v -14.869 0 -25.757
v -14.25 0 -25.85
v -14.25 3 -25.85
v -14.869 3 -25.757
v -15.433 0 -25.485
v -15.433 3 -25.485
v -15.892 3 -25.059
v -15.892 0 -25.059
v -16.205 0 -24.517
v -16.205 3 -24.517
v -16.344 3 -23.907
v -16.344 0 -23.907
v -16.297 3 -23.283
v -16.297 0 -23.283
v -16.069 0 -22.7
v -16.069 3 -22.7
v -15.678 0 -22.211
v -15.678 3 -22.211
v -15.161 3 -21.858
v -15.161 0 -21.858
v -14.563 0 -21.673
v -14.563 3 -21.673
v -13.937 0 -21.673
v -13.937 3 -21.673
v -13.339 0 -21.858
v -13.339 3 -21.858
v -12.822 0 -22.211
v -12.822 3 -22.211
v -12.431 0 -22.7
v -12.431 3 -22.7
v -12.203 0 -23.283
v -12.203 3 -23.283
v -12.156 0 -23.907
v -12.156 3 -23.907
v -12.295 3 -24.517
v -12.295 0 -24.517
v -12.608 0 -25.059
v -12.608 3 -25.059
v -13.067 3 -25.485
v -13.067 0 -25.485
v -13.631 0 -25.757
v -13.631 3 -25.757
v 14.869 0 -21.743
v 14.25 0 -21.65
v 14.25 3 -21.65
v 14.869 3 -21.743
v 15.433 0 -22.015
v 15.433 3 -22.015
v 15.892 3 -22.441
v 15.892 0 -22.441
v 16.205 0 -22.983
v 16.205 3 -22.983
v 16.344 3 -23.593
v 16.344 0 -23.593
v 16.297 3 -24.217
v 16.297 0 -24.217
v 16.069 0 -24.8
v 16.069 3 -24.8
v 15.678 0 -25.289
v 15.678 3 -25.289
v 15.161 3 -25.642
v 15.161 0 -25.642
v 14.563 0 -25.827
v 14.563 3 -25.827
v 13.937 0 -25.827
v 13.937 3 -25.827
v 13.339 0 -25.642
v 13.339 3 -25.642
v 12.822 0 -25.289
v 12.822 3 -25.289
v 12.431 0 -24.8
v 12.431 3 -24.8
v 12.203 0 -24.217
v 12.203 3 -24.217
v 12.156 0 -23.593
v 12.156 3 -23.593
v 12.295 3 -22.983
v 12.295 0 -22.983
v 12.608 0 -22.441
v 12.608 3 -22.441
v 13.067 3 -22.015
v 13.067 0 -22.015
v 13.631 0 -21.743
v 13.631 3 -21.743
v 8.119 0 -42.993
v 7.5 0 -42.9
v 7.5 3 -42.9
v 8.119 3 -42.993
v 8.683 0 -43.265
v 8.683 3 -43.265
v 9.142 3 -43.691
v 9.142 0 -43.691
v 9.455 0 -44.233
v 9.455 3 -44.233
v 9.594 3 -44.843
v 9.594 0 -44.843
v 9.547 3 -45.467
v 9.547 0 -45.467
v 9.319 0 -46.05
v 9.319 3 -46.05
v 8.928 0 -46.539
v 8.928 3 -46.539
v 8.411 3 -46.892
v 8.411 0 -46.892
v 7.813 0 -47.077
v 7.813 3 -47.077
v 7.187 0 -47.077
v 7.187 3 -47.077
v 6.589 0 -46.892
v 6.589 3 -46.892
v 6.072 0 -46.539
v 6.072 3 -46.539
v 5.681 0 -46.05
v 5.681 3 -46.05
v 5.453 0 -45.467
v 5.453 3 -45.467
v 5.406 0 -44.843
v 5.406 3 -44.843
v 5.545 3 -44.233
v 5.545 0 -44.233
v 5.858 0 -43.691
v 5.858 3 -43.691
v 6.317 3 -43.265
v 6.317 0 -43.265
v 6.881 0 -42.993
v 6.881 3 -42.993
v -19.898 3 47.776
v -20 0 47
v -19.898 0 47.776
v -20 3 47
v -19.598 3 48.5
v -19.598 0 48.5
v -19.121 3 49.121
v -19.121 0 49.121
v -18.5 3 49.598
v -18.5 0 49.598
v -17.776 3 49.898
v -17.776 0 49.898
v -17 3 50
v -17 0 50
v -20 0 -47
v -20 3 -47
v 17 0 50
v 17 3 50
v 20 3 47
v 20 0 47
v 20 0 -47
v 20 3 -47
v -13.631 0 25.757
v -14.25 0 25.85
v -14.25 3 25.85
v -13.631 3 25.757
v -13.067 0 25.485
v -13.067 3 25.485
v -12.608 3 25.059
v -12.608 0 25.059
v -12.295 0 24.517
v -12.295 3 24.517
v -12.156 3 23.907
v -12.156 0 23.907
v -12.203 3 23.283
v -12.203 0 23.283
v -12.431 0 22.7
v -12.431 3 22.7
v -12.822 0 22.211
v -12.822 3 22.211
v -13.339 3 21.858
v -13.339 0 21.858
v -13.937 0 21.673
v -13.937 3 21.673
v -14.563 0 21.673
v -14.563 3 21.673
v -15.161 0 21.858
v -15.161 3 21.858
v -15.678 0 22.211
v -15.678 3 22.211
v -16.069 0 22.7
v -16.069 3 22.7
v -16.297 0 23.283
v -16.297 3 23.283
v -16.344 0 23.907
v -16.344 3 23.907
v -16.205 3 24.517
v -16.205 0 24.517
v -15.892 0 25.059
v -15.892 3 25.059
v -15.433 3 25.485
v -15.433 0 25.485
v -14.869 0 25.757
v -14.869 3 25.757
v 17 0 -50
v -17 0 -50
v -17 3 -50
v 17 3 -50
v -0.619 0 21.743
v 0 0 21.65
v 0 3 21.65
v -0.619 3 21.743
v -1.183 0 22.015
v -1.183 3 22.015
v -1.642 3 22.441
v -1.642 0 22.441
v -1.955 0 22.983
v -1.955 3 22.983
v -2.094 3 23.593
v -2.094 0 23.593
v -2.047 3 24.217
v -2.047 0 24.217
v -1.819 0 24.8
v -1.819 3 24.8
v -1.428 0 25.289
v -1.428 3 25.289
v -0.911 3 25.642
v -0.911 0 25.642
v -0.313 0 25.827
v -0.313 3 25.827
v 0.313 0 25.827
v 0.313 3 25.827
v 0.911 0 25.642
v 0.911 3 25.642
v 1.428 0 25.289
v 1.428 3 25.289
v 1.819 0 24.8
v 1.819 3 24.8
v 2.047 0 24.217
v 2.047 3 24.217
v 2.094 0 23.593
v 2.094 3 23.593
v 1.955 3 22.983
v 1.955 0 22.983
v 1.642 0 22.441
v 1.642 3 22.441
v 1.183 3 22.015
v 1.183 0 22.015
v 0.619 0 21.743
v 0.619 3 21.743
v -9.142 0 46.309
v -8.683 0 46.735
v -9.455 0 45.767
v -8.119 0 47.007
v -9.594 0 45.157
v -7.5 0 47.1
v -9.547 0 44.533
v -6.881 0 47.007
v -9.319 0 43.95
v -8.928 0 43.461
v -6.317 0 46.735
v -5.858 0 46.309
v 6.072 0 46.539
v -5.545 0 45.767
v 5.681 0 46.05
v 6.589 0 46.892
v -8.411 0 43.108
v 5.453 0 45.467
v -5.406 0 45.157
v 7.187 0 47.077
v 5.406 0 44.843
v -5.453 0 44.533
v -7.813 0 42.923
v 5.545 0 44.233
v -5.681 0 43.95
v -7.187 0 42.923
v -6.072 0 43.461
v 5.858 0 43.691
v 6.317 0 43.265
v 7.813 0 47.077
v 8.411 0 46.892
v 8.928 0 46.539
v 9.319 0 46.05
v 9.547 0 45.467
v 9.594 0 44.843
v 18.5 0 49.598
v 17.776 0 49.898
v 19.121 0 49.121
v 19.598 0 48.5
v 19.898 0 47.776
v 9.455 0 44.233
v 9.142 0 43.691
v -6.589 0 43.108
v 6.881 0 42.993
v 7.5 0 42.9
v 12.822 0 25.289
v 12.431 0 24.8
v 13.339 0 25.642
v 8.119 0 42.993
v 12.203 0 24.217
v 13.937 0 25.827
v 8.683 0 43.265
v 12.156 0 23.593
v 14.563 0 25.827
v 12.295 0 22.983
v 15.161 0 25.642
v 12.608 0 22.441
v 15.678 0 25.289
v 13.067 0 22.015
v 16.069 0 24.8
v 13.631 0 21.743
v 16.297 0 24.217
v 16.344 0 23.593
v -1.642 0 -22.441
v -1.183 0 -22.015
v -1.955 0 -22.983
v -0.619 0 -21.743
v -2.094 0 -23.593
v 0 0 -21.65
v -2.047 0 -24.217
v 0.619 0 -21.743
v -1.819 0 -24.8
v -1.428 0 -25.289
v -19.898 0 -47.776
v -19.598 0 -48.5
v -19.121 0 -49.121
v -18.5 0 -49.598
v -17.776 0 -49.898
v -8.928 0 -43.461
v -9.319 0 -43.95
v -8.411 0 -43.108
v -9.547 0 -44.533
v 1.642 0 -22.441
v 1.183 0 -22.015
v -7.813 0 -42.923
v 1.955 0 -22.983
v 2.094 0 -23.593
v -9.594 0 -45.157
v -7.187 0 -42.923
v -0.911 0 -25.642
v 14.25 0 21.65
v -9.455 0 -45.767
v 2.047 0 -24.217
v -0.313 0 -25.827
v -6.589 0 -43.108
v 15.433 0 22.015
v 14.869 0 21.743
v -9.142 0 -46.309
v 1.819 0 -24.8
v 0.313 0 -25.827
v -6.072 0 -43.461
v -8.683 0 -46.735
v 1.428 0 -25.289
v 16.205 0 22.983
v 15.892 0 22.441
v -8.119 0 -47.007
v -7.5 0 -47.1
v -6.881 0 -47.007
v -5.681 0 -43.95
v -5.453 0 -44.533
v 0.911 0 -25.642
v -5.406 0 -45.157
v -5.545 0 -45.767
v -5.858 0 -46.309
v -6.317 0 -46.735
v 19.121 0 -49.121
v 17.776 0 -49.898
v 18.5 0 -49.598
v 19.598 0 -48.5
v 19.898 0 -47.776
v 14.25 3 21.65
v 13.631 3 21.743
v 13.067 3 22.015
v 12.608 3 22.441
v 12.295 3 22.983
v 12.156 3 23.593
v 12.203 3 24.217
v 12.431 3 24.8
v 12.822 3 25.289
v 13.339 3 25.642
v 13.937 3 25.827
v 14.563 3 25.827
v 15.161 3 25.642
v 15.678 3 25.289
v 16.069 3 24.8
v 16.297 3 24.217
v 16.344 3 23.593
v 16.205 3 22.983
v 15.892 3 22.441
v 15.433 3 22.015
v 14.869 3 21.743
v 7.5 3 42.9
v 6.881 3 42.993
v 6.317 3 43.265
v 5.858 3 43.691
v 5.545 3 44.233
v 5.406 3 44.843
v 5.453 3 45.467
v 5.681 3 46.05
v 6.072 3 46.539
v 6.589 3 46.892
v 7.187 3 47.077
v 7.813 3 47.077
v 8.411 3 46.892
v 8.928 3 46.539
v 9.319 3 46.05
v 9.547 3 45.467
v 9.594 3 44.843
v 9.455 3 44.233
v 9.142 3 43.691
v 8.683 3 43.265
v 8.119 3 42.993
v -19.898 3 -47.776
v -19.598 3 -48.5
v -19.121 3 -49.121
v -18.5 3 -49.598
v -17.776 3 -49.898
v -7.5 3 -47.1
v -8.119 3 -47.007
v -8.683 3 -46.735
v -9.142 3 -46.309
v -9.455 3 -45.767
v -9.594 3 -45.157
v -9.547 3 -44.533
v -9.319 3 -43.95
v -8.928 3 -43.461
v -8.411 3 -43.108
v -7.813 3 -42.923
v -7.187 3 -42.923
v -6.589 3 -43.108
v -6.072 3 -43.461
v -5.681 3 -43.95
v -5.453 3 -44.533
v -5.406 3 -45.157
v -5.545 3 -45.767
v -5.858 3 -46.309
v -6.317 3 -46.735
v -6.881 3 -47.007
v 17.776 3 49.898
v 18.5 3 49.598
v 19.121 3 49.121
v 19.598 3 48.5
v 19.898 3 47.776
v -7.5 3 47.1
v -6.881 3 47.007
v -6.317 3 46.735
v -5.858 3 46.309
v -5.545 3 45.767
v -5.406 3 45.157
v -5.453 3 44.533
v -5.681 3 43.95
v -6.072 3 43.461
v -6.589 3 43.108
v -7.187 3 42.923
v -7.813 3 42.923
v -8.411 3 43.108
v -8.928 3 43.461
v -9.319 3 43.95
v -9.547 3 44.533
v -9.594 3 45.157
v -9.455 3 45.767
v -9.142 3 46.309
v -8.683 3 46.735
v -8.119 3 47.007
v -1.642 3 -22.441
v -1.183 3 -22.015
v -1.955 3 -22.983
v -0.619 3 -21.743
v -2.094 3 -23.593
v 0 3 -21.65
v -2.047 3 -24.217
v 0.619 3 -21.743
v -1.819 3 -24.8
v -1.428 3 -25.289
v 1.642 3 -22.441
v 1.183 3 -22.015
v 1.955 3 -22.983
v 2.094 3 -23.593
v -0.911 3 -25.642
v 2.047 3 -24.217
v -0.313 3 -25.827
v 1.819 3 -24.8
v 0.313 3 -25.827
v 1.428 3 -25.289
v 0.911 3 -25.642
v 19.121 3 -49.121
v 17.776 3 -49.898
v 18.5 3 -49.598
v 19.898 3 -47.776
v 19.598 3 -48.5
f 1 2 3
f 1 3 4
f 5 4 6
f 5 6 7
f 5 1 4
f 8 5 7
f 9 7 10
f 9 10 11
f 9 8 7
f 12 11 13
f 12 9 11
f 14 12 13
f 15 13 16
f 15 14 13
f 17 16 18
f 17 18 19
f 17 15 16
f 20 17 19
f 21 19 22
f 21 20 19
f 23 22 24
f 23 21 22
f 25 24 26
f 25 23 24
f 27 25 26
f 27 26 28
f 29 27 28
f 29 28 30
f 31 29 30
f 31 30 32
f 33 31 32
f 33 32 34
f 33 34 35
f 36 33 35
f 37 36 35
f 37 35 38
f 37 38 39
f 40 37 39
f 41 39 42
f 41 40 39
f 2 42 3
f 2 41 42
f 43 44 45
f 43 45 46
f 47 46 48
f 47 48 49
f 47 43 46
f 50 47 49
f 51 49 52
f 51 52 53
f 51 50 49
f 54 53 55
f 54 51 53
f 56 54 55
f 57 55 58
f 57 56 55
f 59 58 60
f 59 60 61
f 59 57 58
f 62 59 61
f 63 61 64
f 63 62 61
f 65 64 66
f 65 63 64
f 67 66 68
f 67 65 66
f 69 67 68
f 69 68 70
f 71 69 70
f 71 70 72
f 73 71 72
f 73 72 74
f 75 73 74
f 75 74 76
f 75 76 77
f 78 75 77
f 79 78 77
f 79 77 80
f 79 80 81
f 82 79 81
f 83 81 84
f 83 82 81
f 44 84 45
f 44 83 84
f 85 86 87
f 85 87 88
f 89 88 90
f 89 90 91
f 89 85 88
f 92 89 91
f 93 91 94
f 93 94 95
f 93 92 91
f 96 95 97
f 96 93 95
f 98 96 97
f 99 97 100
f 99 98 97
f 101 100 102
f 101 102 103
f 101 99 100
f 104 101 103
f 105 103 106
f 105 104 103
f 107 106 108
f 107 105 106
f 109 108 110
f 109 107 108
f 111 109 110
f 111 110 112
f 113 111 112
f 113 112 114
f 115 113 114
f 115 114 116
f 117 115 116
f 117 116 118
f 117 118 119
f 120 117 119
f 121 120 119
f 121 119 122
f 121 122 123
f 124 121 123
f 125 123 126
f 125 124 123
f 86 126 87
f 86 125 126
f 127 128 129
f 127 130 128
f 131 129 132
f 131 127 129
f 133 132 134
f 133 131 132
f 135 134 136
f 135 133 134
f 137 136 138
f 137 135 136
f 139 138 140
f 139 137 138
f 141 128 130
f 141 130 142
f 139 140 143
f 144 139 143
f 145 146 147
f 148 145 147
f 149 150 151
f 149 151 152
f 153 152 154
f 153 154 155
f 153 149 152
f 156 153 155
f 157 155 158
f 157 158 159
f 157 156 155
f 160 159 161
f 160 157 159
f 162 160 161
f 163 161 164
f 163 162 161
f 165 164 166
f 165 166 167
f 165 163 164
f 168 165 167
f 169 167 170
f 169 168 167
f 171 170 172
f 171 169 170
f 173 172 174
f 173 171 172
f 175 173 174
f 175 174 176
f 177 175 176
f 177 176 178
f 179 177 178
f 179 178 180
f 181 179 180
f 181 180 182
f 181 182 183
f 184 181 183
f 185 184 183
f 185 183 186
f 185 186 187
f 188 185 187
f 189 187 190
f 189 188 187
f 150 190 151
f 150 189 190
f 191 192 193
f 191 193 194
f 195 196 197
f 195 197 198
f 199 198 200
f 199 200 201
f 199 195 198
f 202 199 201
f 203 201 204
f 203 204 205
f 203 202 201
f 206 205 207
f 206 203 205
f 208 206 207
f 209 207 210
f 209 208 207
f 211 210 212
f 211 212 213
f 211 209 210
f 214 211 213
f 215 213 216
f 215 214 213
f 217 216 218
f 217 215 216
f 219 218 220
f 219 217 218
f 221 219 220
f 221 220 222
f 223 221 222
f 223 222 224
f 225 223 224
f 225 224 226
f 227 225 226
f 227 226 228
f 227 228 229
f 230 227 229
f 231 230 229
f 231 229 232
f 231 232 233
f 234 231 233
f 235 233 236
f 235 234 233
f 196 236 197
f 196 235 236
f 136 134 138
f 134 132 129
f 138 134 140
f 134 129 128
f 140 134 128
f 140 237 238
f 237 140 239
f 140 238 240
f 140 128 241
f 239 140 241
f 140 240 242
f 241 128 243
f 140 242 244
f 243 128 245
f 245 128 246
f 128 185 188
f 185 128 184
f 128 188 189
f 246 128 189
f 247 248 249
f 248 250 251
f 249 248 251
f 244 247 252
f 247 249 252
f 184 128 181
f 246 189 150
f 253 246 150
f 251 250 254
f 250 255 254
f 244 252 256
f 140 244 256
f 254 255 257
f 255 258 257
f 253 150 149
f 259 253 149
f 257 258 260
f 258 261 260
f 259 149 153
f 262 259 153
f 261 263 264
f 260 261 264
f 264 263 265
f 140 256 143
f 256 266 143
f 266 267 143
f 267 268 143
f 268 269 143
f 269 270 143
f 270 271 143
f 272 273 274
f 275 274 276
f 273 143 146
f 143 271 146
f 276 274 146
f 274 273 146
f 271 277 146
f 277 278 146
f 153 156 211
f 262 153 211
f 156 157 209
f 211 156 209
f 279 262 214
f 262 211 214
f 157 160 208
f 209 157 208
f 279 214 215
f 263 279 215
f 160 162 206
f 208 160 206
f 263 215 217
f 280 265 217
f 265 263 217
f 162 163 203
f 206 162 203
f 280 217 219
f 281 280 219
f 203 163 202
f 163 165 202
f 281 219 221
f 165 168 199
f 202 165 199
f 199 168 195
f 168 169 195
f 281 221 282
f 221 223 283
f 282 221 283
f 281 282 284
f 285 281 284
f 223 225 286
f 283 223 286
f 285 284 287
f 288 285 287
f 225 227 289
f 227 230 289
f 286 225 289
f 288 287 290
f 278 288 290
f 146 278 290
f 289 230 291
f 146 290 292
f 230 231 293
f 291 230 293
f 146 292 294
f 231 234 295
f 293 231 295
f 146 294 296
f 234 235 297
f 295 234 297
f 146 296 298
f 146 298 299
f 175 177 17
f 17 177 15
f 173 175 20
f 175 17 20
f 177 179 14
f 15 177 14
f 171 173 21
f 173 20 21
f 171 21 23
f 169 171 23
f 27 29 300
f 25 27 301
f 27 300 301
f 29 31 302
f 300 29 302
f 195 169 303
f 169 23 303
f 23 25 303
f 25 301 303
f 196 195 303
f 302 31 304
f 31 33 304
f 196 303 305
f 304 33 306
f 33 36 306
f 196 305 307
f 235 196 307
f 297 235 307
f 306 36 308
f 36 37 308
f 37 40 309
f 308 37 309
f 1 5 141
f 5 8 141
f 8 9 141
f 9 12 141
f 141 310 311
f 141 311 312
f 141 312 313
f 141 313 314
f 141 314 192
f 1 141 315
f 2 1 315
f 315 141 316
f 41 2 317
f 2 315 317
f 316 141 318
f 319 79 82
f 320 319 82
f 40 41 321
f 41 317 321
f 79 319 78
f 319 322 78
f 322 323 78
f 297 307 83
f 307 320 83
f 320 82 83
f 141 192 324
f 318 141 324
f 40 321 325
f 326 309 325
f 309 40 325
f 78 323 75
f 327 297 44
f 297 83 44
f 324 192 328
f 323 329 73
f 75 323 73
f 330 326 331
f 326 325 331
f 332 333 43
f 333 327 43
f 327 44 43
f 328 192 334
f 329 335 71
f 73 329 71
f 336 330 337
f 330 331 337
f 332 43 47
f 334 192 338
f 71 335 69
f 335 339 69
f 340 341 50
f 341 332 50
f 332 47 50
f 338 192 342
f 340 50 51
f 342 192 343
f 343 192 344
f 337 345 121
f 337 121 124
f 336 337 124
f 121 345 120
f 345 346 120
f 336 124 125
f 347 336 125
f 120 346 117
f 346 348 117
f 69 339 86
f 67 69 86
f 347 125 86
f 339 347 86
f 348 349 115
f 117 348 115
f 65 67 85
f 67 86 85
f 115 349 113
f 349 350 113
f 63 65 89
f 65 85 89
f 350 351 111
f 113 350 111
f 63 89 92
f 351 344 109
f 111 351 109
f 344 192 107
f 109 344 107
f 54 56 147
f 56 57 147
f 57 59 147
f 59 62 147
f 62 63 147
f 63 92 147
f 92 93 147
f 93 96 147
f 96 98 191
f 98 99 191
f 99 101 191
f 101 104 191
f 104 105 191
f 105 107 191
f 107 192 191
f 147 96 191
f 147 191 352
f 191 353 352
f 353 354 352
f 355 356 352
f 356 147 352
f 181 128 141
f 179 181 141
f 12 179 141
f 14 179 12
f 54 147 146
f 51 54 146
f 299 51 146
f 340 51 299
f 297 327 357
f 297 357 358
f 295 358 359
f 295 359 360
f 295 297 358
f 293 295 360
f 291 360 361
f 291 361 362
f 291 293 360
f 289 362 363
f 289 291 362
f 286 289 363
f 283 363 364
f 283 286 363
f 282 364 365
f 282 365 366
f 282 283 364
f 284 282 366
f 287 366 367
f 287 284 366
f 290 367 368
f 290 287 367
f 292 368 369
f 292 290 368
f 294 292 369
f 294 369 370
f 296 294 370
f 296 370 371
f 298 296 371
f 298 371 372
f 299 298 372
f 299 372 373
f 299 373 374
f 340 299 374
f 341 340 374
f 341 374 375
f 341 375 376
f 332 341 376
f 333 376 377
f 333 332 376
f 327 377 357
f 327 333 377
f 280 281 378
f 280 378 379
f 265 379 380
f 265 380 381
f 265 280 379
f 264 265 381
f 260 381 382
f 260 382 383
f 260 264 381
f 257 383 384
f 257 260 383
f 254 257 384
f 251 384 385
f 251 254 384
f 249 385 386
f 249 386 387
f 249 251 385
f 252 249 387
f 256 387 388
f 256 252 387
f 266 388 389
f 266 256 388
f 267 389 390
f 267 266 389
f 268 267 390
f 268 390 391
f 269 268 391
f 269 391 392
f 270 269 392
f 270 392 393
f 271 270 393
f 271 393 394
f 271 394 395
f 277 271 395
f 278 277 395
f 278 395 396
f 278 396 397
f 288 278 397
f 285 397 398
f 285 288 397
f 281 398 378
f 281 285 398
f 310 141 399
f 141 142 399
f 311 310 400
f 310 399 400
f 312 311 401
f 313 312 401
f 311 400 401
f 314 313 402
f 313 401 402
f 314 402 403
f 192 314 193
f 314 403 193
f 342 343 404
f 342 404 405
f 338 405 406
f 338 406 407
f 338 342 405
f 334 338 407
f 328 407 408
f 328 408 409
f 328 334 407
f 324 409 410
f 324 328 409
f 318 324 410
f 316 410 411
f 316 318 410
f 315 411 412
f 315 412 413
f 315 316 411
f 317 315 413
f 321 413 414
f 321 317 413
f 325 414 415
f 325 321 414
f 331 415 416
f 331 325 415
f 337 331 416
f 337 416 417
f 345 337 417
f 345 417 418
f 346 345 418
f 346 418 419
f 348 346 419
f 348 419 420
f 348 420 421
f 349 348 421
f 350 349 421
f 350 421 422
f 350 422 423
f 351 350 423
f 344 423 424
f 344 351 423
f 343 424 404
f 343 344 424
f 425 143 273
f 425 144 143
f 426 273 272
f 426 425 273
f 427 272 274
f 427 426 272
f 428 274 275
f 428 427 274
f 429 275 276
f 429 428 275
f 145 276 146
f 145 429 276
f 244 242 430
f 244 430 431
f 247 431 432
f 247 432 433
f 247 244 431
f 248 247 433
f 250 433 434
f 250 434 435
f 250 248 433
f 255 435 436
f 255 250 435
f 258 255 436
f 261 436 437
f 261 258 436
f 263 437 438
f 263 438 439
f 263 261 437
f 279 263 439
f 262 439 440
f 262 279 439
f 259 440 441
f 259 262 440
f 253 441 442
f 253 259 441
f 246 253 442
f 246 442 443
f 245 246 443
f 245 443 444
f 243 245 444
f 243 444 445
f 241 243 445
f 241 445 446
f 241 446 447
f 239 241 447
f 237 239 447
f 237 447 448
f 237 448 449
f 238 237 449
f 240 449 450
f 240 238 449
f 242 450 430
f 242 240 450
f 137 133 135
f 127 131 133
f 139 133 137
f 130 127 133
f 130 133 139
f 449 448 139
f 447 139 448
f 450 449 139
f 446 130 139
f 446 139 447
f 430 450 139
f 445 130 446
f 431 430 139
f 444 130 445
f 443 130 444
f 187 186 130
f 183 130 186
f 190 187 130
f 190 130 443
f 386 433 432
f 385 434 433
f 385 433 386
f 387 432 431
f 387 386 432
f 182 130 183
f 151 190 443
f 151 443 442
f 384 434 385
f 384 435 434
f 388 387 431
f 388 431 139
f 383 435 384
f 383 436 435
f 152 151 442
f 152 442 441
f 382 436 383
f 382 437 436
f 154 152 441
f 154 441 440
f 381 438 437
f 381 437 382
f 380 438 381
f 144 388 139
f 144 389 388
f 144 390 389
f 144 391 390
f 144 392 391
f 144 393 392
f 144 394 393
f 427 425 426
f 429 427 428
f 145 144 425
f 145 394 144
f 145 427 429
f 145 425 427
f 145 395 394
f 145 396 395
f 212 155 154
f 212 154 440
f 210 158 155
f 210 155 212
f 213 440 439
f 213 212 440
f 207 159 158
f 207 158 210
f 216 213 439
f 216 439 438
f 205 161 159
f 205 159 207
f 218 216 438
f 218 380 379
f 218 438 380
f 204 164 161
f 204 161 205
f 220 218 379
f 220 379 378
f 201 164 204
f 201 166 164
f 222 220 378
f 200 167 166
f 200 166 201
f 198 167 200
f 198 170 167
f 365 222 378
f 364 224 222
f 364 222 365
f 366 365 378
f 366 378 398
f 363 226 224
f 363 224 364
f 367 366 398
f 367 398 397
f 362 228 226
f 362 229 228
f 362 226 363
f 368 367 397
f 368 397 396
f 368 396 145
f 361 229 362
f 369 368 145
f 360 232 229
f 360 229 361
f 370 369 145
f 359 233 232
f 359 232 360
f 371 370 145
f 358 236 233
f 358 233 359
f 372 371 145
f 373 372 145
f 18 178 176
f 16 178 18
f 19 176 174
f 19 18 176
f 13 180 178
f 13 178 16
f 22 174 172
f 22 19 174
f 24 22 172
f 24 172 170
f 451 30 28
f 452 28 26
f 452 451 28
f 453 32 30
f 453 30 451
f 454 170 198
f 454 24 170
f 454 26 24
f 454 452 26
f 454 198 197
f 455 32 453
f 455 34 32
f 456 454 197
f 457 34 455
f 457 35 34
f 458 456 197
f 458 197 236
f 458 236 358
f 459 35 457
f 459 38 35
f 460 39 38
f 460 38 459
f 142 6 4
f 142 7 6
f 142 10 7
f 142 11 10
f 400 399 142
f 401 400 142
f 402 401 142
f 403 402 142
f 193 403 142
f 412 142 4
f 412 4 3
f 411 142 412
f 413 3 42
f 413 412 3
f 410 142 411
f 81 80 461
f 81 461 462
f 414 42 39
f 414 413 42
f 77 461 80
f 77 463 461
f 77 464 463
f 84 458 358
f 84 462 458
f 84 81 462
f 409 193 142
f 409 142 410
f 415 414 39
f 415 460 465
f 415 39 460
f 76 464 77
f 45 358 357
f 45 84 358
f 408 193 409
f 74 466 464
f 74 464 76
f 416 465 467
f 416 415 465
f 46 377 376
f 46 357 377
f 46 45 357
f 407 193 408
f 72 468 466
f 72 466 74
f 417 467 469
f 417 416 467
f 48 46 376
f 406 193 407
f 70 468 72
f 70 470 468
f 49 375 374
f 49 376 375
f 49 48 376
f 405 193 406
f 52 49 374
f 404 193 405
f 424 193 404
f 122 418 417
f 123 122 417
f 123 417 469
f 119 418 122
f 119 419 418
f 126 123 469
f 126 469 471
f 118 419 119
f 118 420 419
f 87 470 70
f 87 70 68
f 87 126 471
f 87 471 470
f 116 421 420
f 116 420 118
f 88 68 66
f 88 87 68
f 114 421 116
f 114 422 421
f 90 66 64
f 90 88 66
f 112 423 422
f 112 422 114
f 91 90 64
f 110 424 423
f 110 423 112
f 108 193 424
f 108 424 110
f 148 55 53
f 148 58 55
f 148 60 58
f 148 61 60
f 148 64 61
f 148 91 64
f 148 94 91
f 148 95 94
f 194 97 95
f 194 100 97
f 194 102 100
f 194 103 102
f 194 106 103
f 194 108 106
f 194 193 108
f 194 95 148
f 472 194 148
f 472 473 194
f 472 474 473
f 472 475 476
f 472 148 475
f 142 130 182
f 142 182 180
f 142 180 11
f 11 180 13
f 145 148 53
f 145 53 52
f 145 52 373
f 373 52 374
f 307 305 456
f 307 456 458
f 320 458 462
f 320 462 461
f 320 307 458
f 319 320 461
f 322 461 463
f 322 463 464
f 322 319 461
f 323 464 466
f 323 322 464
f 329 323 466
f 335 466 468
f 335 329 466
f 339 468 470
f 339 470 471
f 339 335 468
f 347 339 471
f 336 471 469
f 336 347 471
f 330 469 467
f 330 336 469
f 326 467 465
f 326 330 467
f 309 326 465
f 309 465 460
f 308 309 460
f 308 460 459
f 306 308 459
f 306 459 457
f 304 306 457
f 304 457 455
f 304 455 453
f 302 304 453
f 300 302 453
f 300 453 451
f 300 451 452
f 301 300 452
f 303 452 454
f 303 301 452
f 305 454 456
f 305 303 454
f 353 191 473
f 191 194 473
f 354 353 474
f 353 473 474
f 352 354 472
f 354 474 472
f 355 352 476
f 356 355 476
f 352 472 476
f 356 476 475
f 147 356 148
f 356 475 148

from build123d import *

# Parameters (mm, degrees)
SKETCH_1_W      = 40
SKETCH_1_H      = 100
SKETCH_1_R      = 2.1
EXTRUDE_1_DEPTH = 3
FILLET_1_R      = 3


with BuildPart() as part:
    # ｽｹｯﾁ1 → ﾎﾞｽ - 押し出し1 (new body)
    with BuildSketch(Plane(origin=(0, 0, 0), x_dir=(1, 0, 0), z_dir=(0, 1, 0))):
        Rectangle(SKETCH_1_W, SKETCH_1_H)
        with Locations(Location((14.25, 23.75, 0), (0, 0, 270))):
            Circle(SKETCH_1_R, mode=Mode.SUBTRACT)
        with Locations(Location((-14.25, 23.75, 0), (0, 0, 90))):
            Circle(SKETCH_1_R, mode=Mode.SUBTRACT)
        with Locations(Location((-14.25, -23.75, 0), (0, 0, 270))):
            Circle(SKETCH_1_R, mode=Mode.SUBTRACT)
        with Locations(Location((14.25, -23.75, 0), (0, 0, 90))):
            Circle(SKETCH_1_R, mode=Mode.SUBTRACT)
        with Locations(Location((7.5, 45, 0), (0, 0, 270))):
            Circle(SKETCH_1_R, mode=Mode.SUBTRACT)
        with Locations(Location((-7.5, 45, 0), (0, 0, 90))):
            Circle(SKETCH_1_R, mode=Mode.SUBTRACT)
        with Locations(Location((-7.5, -45, 0), (0, 0, 270))):
            Circle(SKETCH_1_R, mode=Mode.SUBTRACT)
        with Locations(Location((7.5, -45, 0), (0, 0, 90))):
            Circle(SKETCH_1_R, mode=Mode.SUBTRACT)
        with Locations(Location((0, 23.75, 0), (0, 0, 270))):
            Circle(SKETCH_1_R, mode=Mode.SUBTRACT)
        with Locations(Location((0, -23.75, 0), (0, 0, 90))):
            Circle(SKETCH_1_R, mode=Mode.SUBTRACT)
    extrude(amount=EXTRUDE_1_DEPTH)

    # ﾌｨﾚｯﾄ1
    fillet_1_edges = [part.edges().sort_by_distance(p)[0] for p in [
        (20, 1.5, 50),
        (-20, 1.5, 50),
        (-20, 1.5, -50),
        (20, 1.5, -50),
    ]]
    fillet(fillet_1_edges, radius=FILLET_1_R)


solid = part.part
